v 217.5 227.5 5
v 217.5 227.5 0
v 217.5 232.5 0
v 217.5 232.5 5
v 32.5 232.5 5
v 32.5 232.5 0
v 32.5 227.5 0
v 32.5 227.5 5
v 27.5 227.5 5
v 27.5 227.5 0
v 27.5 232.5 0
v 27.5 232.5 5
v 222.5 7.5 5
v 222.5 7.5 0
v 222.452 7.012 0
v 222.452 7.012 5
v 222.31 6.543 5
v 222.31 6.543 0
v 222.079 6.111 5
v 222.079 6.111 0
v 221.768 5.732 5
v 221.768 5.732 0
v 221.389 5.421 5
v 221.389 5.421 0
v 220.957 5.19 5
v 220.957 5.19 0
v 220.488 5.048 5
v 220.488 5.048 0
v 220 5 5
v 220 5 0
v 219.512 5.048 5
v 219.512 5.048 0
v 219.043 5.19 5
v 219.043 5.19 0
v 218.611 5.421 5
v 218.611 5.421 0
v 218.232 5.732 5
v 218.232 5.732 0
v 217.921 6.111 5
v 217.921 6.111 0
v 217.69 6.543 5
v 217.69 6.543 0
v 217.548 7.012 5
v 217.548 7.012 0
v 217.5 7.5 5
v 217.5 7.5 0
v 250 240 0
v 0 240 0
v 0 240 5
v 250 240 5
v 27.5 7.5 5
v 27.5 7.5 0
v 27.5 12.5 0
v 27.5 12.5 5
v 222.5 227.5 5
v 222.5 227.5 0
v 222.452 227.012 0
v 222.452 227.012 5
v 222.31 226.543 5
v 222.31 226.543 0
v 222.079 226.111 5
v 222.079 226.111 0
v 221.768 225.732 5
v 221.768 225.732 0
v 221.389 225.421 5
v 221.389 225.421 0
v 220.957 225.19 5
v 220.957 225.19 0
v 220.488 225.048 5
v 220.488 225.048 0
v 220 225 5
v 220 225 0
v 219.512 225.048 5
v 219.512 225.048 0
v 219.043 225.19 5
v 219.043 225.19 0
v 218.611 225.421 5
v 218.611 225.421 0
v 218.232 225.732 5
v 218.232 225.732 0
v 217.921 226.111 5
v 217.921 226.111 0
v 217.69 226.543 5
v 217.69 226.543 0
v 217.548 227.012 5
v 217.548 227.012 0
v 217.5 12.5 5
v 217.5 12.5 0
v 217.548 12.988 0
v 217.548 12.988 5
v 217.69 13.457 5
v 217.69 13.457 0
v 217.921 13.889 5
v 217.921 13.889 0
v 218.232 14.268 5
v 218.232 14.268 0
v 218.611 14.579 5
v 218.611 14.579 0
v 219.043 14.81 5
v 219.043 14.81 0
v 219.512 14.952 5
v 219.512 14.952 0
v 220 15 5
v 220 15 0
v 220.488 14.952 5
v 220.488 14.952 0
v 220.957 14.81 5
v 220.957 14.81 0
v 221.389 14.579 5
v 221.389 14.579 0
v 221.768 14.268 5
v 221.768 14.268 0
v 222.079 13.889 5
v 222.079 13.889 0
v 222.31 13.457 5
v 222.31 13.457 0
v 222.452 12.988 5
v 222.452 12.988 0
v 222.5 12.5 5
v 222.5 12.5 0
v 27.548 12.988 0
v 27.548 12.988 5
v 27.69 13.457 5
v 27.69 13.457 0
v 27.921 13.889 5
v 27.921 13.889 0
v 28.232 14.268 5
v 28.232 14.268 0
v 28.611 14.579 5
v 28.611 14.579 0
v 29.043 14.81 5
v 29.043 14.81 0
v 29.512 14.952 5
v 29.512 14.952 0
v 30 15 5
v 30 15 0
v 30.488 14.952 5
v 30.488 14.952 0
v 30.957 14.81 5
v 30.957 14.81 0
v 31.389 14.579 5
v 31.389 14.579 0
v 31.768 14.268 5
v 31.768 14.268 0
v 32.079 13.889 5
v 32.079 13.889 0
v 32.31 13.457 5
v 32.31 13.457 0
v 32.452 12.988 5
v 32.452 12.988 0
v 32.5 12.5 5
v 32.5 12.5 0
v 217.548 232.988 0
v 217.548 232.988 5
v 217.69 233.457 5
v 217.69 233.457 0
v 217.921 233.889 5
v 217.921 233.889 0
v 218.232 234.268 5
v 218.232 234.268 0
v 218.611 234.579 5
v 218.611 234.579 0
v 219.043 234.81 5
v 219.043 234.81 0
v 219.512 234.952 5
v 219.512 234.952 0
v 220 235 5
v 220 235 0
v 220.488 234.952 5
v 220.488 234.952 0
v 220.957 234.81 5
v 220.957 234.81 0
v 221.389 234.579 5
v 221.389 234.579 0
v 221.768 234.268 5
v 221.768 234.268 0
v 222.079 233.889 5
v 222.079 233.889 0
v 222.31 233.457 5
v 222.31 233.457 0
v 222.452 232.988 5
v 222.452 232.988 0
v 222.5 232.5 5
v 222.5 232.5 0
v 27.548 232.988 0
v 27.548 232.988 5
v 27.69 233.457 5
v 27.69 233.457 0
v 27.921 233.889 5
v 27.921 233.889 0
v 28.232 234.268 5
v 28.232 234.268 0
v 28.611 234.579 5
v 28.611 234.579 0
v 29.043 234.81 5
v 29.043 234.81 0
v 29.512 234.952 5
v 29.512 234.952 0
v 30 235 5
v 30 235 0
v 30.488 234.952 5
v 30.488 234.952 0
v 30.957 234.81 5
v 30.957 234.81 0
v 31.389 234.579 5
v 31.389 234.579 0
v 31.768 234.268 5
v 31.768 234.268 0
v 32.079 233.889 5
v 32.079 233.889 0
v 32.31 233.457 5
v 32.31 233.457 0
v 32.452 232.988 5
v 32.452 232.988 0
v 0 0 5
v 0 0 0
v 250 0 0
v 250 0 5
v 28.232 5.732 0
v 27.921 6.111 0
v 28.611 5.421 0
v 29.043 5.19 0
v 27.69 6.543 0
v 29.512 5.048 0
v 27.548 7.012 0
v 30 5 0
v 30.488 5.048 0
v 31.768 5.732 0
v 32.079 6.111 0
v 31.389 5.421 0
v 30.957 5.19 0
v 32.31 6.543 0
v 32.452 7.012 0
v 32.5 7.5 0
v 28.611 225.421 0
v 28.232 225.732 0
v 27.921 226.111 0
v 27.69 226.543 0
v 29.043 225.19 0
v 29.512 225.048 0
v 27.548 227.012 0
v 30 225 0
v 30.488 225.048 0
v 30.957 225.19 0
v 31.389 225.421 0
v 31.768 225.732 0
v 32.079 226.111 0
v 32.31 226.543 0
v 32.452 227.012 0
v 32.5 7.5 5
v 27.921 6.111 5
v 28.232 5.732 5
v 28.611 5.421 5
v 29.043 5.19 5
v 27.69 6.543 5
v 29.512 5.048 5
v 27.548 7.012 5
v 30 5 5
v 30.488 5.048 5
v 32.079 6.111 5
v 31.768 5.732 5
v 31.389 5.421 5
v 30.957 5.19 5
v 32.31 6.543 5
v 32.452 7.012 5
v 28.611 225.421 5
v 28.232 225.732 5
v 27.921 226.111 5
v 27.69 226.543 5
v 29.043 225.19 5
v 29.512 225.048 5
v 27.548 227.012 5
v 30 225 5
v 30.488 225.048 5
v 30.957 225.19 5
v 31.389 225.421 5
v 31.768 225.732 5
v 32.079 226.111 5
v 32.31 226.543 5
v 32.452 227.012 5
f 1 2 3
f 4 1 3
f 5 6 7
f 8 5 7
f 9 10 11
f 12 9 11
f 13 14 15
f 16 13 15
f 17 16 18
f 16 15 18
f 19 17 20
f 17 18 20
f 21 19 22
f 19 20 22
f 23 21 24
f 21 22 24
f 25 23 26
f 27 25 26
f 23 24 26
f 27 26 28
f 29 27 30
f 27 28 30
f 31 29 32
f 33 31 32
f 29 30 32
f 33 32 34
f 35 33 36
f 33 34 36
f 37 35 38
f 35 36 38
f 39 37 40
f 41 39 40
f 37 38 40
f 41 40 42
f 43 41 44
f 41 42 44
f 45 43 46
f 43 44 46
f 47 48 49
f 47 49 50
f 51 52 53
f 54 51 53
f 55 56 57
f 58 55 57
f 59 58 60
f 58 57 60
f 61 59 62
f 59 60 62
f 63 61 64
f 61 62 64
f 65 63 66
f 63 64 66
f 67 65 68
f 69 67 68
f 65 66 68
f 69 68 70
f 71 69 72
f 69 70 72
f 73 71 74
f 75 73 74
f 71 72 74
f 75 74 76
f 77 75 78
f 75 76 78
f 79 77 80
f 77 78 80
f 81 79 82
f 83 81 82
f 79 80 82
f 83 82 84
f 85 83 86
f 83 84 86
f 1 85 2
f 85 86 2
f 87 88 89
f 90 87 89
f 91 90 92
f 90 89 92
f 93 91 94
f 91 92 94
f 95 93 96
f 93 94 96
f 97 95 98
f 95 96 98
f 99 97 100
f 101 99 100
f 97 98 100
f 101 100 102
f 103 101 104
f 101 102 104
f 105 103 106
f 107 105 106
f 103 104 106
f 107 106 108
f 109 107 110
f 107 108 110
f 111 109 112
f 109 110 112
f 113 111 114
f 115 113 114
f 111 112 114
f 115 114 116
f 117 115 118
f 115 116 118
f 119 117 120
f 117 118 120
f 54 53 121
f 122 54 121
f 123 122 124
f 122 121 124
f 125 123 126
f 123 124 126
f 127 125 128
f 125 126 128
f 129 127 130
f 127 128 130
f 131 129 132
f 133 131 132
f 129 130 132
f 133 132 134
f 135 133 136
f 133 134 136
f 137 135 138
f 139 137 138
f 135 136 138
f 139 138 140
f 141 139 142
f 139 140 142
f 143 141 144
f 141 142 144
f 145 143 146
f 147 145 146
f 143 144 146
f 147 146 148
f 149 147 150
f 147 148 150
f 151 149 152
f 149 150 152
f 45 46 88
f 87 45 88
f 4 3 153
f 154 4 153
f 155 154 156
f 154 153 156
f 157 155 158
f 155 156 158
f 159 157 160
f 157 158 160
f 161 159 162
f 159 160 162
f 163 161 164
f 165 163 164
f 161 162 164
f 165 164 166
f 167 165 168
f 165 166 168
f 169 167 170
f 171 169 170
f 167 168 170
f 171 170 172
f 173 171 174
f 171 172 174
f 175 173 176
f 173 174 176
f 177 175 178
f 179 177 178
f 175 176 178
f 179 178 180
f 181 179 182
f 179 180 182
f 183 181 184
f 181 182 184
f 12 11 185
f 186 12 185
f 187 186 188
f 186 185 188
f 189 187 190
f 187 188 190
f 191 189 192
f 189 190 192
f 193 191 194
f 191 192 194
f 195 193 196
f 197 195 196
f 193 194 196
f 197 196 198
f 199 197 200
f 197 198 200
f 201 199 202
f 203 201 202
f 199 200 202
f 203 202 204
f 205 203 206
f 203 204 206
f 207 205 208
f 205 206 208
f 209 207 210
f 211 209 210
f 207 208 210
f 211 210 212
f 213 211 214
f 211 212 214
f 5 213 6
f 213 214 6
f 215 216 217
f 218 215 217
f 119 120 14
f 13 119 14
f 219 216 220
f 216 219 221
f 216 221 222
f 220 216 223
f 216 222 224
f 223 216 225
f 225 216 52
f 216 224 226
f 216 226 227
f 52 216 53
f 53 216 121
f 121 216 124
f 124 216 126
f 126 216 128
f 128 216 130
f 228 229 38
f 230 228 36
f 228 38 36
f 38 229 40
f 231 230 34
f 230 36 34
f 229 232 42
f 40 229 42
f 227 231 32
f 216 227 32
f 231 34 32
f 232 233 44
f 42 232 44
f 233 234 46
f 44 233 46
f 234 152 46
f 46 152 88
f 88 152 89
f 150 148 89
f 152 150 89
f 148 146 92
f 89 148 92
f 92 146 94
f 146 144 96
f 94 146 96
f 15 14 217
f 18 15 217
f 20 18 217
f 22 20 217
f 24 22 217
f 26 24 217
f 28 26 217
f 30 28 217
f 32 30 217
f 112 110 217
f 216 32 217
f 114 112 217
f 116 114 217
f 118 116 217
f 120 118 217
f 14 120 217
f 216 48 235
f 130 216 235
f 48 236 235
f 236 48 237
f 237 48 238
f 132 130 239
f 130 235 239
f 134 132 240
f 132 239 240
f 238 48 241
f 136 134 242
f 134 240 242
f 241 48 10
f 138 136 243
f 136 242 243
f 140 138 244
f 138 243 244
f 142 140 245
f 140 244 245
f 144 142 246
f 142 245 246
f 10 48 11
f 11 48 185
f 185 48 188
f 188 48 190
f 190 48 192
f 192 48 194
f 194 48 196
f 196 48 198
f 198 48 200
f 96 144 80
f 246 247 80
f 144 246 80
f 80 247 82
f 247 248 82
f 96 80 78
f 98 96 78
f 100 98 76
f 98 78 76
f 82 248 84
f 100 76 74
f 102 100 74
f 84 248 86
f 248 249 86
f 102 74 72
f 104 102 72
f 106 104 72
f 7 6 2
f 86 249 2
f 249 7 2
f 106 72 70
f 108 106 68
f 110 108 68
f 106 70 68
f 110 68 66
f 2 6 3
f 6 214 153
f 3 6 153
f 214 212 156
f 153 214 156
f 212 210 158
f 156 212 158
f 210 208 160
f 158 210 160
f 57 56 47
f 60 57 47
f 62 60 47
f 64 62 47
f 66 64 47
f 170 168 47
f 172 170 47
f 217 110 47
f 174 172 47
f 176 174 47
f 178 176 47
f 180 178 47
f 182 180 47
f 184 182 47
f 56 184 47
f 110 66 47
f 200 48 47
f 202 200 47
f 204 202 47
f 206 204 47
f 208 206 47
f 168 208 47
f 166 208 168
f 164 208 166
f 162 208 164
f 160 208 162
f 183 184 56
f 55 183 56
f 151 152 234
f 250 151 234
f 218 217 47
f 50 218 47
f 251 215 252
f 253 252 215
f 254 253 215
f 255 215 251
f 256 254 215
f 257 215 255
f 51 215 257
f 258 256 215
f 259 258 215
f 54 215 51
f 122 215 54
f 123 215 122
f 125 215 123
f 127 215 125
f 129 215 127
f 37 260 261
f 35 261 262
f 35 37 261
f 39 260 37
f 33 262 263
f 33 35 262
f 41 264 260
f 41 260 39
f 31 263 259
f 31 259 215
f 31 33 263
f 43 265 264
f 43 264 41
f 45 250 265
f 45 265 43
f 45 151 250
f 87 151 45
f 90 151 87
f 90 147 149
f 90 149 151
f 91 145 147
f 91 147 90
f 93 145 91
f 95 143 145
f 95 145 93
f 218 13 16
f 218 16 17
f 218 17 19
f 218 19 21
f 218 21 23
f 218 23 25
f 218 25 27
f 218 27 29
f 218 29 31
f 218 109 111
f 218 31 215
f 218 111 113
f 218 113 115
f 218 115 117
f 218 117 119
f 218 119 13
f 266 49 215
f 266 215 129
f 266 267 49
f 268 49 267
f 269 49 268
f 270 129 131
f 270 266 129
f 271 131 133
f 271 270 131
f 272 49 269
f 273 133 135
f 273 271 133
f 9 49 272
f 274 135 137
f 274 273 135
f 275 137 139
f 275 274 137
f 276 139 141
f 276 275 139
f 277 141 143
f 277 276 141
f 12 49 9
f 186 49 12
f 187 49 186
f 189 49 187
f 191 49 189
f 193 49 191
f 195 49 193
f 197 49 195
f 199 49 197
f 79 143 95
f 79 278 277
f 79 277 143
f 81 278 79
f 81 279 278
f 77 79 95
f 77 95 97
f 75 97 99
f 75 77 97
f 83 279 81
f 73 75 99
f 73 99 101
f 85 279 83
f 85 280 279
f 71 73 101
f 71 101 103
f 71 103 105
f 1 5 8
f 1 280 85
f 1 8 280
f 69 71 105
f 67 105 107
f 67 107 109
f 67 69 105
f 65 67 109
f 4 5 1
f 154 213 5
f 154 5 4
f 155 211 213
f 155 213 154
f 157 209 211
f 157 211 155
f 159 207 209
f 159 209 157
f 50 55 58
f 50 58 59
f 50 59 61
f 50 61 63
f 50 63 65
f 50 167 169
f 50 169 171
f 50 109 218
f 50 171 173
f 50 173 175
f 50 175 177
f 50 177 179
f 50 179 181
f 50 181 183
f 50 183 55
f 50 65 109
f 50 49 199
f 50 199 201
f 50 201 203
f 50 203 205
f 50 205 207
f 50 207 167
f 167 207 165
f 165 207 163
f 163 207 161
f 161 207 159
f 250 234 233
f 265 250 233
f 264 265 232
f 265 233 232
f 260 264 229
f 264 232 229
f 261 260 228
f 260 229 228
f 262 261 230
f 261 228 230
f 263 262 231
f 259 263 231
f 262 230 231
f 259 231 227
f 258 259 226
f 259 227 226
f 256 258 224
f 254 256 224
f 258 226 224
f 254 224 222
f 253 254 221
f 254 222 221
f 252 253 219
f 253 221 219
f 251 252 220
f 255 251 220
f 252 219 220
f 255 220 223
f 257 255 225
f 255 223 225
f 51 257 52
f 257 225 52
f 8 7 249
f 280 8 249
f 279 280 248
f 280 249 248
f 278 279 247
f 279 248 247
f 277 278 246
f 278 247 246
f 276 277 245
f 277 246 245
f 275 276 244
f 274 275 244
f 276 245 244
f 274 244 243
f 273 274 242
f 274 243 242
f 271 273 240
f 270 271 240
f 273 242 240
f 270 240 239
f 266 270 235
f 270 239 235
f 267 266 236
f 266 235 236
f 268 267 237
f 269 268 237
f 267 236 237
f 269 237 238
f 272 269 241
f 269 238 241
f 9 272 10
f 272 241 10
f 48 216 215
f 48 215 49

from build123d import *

# Parameters (mm, degrees)
ESQUISSE1_W                     = 250
ESQUISSE1_H                     = 240
BOSS_EXTRU_1_DEPTH              = 5
ENL_V_MAT_EXTRU_1_DEPTH         = 5
R_P_TITION_LIN_AIRE1_COUNT      = 2
R_P_TITION_LIN_AIRE1_PITCH      = 220
R_P_TITION_LIN_AIRE1_COUNT_DIR2 = 2
R_P_TITION_LIN_AIRE1_PITCH_DIR2 = 190


with BuildPart() as part:
    # Esquisse1 → Boss.-Extru.1 (new body)
    with BuildSketch(Plane.XY):
        with Locations((125, 120)):
            Rectangle(ESQUISSE1_W, ESQUISSE1_H)
    extrude(amount=BOSS_EXTRU_1_DEPTH)

    # Esquisse2 → Enlèv. mat.-Extru.1 (cut)
    with BuildSketch(Plane.XY):
        with BuildLine():
            Line((27.5, 7.5), (27.5, 12.5))
            ThreePointArc((27.5, 12.5), (30, 15), (32.5, 12.5))
            Line((32.5, 12.5), (32.5, 7.5))
            ThreePointArc((32.5, 7.5), (30, 5), (27.5, 7.5))
        make_face()
    enl_v_mat_extru_1 = extrude(amount=ENL_V_MAT_EXTRU_1_DEPTH, mode=Mode.SUBTRACT)

    # Répétition linéaire1: Enl_v. mat.-Extru.1 2 × 2
    with Locations(*[(j * R_P_TITION_LIN_AIRE1_PITCH_DIR2, i * R_P_TITION_LIN_AIRE1_PITCH, 0) for i in range(R_P_TITION_LIN_AIRE1_COUNT) for j in range(R_P_TITION_LIN_AIRE1_COUNT_DIR2) if (i, j) != (0, 0)]):
        add(enl_v_mat_extru_1, mode=Mode.SUBTRACT)


solid = part.part
